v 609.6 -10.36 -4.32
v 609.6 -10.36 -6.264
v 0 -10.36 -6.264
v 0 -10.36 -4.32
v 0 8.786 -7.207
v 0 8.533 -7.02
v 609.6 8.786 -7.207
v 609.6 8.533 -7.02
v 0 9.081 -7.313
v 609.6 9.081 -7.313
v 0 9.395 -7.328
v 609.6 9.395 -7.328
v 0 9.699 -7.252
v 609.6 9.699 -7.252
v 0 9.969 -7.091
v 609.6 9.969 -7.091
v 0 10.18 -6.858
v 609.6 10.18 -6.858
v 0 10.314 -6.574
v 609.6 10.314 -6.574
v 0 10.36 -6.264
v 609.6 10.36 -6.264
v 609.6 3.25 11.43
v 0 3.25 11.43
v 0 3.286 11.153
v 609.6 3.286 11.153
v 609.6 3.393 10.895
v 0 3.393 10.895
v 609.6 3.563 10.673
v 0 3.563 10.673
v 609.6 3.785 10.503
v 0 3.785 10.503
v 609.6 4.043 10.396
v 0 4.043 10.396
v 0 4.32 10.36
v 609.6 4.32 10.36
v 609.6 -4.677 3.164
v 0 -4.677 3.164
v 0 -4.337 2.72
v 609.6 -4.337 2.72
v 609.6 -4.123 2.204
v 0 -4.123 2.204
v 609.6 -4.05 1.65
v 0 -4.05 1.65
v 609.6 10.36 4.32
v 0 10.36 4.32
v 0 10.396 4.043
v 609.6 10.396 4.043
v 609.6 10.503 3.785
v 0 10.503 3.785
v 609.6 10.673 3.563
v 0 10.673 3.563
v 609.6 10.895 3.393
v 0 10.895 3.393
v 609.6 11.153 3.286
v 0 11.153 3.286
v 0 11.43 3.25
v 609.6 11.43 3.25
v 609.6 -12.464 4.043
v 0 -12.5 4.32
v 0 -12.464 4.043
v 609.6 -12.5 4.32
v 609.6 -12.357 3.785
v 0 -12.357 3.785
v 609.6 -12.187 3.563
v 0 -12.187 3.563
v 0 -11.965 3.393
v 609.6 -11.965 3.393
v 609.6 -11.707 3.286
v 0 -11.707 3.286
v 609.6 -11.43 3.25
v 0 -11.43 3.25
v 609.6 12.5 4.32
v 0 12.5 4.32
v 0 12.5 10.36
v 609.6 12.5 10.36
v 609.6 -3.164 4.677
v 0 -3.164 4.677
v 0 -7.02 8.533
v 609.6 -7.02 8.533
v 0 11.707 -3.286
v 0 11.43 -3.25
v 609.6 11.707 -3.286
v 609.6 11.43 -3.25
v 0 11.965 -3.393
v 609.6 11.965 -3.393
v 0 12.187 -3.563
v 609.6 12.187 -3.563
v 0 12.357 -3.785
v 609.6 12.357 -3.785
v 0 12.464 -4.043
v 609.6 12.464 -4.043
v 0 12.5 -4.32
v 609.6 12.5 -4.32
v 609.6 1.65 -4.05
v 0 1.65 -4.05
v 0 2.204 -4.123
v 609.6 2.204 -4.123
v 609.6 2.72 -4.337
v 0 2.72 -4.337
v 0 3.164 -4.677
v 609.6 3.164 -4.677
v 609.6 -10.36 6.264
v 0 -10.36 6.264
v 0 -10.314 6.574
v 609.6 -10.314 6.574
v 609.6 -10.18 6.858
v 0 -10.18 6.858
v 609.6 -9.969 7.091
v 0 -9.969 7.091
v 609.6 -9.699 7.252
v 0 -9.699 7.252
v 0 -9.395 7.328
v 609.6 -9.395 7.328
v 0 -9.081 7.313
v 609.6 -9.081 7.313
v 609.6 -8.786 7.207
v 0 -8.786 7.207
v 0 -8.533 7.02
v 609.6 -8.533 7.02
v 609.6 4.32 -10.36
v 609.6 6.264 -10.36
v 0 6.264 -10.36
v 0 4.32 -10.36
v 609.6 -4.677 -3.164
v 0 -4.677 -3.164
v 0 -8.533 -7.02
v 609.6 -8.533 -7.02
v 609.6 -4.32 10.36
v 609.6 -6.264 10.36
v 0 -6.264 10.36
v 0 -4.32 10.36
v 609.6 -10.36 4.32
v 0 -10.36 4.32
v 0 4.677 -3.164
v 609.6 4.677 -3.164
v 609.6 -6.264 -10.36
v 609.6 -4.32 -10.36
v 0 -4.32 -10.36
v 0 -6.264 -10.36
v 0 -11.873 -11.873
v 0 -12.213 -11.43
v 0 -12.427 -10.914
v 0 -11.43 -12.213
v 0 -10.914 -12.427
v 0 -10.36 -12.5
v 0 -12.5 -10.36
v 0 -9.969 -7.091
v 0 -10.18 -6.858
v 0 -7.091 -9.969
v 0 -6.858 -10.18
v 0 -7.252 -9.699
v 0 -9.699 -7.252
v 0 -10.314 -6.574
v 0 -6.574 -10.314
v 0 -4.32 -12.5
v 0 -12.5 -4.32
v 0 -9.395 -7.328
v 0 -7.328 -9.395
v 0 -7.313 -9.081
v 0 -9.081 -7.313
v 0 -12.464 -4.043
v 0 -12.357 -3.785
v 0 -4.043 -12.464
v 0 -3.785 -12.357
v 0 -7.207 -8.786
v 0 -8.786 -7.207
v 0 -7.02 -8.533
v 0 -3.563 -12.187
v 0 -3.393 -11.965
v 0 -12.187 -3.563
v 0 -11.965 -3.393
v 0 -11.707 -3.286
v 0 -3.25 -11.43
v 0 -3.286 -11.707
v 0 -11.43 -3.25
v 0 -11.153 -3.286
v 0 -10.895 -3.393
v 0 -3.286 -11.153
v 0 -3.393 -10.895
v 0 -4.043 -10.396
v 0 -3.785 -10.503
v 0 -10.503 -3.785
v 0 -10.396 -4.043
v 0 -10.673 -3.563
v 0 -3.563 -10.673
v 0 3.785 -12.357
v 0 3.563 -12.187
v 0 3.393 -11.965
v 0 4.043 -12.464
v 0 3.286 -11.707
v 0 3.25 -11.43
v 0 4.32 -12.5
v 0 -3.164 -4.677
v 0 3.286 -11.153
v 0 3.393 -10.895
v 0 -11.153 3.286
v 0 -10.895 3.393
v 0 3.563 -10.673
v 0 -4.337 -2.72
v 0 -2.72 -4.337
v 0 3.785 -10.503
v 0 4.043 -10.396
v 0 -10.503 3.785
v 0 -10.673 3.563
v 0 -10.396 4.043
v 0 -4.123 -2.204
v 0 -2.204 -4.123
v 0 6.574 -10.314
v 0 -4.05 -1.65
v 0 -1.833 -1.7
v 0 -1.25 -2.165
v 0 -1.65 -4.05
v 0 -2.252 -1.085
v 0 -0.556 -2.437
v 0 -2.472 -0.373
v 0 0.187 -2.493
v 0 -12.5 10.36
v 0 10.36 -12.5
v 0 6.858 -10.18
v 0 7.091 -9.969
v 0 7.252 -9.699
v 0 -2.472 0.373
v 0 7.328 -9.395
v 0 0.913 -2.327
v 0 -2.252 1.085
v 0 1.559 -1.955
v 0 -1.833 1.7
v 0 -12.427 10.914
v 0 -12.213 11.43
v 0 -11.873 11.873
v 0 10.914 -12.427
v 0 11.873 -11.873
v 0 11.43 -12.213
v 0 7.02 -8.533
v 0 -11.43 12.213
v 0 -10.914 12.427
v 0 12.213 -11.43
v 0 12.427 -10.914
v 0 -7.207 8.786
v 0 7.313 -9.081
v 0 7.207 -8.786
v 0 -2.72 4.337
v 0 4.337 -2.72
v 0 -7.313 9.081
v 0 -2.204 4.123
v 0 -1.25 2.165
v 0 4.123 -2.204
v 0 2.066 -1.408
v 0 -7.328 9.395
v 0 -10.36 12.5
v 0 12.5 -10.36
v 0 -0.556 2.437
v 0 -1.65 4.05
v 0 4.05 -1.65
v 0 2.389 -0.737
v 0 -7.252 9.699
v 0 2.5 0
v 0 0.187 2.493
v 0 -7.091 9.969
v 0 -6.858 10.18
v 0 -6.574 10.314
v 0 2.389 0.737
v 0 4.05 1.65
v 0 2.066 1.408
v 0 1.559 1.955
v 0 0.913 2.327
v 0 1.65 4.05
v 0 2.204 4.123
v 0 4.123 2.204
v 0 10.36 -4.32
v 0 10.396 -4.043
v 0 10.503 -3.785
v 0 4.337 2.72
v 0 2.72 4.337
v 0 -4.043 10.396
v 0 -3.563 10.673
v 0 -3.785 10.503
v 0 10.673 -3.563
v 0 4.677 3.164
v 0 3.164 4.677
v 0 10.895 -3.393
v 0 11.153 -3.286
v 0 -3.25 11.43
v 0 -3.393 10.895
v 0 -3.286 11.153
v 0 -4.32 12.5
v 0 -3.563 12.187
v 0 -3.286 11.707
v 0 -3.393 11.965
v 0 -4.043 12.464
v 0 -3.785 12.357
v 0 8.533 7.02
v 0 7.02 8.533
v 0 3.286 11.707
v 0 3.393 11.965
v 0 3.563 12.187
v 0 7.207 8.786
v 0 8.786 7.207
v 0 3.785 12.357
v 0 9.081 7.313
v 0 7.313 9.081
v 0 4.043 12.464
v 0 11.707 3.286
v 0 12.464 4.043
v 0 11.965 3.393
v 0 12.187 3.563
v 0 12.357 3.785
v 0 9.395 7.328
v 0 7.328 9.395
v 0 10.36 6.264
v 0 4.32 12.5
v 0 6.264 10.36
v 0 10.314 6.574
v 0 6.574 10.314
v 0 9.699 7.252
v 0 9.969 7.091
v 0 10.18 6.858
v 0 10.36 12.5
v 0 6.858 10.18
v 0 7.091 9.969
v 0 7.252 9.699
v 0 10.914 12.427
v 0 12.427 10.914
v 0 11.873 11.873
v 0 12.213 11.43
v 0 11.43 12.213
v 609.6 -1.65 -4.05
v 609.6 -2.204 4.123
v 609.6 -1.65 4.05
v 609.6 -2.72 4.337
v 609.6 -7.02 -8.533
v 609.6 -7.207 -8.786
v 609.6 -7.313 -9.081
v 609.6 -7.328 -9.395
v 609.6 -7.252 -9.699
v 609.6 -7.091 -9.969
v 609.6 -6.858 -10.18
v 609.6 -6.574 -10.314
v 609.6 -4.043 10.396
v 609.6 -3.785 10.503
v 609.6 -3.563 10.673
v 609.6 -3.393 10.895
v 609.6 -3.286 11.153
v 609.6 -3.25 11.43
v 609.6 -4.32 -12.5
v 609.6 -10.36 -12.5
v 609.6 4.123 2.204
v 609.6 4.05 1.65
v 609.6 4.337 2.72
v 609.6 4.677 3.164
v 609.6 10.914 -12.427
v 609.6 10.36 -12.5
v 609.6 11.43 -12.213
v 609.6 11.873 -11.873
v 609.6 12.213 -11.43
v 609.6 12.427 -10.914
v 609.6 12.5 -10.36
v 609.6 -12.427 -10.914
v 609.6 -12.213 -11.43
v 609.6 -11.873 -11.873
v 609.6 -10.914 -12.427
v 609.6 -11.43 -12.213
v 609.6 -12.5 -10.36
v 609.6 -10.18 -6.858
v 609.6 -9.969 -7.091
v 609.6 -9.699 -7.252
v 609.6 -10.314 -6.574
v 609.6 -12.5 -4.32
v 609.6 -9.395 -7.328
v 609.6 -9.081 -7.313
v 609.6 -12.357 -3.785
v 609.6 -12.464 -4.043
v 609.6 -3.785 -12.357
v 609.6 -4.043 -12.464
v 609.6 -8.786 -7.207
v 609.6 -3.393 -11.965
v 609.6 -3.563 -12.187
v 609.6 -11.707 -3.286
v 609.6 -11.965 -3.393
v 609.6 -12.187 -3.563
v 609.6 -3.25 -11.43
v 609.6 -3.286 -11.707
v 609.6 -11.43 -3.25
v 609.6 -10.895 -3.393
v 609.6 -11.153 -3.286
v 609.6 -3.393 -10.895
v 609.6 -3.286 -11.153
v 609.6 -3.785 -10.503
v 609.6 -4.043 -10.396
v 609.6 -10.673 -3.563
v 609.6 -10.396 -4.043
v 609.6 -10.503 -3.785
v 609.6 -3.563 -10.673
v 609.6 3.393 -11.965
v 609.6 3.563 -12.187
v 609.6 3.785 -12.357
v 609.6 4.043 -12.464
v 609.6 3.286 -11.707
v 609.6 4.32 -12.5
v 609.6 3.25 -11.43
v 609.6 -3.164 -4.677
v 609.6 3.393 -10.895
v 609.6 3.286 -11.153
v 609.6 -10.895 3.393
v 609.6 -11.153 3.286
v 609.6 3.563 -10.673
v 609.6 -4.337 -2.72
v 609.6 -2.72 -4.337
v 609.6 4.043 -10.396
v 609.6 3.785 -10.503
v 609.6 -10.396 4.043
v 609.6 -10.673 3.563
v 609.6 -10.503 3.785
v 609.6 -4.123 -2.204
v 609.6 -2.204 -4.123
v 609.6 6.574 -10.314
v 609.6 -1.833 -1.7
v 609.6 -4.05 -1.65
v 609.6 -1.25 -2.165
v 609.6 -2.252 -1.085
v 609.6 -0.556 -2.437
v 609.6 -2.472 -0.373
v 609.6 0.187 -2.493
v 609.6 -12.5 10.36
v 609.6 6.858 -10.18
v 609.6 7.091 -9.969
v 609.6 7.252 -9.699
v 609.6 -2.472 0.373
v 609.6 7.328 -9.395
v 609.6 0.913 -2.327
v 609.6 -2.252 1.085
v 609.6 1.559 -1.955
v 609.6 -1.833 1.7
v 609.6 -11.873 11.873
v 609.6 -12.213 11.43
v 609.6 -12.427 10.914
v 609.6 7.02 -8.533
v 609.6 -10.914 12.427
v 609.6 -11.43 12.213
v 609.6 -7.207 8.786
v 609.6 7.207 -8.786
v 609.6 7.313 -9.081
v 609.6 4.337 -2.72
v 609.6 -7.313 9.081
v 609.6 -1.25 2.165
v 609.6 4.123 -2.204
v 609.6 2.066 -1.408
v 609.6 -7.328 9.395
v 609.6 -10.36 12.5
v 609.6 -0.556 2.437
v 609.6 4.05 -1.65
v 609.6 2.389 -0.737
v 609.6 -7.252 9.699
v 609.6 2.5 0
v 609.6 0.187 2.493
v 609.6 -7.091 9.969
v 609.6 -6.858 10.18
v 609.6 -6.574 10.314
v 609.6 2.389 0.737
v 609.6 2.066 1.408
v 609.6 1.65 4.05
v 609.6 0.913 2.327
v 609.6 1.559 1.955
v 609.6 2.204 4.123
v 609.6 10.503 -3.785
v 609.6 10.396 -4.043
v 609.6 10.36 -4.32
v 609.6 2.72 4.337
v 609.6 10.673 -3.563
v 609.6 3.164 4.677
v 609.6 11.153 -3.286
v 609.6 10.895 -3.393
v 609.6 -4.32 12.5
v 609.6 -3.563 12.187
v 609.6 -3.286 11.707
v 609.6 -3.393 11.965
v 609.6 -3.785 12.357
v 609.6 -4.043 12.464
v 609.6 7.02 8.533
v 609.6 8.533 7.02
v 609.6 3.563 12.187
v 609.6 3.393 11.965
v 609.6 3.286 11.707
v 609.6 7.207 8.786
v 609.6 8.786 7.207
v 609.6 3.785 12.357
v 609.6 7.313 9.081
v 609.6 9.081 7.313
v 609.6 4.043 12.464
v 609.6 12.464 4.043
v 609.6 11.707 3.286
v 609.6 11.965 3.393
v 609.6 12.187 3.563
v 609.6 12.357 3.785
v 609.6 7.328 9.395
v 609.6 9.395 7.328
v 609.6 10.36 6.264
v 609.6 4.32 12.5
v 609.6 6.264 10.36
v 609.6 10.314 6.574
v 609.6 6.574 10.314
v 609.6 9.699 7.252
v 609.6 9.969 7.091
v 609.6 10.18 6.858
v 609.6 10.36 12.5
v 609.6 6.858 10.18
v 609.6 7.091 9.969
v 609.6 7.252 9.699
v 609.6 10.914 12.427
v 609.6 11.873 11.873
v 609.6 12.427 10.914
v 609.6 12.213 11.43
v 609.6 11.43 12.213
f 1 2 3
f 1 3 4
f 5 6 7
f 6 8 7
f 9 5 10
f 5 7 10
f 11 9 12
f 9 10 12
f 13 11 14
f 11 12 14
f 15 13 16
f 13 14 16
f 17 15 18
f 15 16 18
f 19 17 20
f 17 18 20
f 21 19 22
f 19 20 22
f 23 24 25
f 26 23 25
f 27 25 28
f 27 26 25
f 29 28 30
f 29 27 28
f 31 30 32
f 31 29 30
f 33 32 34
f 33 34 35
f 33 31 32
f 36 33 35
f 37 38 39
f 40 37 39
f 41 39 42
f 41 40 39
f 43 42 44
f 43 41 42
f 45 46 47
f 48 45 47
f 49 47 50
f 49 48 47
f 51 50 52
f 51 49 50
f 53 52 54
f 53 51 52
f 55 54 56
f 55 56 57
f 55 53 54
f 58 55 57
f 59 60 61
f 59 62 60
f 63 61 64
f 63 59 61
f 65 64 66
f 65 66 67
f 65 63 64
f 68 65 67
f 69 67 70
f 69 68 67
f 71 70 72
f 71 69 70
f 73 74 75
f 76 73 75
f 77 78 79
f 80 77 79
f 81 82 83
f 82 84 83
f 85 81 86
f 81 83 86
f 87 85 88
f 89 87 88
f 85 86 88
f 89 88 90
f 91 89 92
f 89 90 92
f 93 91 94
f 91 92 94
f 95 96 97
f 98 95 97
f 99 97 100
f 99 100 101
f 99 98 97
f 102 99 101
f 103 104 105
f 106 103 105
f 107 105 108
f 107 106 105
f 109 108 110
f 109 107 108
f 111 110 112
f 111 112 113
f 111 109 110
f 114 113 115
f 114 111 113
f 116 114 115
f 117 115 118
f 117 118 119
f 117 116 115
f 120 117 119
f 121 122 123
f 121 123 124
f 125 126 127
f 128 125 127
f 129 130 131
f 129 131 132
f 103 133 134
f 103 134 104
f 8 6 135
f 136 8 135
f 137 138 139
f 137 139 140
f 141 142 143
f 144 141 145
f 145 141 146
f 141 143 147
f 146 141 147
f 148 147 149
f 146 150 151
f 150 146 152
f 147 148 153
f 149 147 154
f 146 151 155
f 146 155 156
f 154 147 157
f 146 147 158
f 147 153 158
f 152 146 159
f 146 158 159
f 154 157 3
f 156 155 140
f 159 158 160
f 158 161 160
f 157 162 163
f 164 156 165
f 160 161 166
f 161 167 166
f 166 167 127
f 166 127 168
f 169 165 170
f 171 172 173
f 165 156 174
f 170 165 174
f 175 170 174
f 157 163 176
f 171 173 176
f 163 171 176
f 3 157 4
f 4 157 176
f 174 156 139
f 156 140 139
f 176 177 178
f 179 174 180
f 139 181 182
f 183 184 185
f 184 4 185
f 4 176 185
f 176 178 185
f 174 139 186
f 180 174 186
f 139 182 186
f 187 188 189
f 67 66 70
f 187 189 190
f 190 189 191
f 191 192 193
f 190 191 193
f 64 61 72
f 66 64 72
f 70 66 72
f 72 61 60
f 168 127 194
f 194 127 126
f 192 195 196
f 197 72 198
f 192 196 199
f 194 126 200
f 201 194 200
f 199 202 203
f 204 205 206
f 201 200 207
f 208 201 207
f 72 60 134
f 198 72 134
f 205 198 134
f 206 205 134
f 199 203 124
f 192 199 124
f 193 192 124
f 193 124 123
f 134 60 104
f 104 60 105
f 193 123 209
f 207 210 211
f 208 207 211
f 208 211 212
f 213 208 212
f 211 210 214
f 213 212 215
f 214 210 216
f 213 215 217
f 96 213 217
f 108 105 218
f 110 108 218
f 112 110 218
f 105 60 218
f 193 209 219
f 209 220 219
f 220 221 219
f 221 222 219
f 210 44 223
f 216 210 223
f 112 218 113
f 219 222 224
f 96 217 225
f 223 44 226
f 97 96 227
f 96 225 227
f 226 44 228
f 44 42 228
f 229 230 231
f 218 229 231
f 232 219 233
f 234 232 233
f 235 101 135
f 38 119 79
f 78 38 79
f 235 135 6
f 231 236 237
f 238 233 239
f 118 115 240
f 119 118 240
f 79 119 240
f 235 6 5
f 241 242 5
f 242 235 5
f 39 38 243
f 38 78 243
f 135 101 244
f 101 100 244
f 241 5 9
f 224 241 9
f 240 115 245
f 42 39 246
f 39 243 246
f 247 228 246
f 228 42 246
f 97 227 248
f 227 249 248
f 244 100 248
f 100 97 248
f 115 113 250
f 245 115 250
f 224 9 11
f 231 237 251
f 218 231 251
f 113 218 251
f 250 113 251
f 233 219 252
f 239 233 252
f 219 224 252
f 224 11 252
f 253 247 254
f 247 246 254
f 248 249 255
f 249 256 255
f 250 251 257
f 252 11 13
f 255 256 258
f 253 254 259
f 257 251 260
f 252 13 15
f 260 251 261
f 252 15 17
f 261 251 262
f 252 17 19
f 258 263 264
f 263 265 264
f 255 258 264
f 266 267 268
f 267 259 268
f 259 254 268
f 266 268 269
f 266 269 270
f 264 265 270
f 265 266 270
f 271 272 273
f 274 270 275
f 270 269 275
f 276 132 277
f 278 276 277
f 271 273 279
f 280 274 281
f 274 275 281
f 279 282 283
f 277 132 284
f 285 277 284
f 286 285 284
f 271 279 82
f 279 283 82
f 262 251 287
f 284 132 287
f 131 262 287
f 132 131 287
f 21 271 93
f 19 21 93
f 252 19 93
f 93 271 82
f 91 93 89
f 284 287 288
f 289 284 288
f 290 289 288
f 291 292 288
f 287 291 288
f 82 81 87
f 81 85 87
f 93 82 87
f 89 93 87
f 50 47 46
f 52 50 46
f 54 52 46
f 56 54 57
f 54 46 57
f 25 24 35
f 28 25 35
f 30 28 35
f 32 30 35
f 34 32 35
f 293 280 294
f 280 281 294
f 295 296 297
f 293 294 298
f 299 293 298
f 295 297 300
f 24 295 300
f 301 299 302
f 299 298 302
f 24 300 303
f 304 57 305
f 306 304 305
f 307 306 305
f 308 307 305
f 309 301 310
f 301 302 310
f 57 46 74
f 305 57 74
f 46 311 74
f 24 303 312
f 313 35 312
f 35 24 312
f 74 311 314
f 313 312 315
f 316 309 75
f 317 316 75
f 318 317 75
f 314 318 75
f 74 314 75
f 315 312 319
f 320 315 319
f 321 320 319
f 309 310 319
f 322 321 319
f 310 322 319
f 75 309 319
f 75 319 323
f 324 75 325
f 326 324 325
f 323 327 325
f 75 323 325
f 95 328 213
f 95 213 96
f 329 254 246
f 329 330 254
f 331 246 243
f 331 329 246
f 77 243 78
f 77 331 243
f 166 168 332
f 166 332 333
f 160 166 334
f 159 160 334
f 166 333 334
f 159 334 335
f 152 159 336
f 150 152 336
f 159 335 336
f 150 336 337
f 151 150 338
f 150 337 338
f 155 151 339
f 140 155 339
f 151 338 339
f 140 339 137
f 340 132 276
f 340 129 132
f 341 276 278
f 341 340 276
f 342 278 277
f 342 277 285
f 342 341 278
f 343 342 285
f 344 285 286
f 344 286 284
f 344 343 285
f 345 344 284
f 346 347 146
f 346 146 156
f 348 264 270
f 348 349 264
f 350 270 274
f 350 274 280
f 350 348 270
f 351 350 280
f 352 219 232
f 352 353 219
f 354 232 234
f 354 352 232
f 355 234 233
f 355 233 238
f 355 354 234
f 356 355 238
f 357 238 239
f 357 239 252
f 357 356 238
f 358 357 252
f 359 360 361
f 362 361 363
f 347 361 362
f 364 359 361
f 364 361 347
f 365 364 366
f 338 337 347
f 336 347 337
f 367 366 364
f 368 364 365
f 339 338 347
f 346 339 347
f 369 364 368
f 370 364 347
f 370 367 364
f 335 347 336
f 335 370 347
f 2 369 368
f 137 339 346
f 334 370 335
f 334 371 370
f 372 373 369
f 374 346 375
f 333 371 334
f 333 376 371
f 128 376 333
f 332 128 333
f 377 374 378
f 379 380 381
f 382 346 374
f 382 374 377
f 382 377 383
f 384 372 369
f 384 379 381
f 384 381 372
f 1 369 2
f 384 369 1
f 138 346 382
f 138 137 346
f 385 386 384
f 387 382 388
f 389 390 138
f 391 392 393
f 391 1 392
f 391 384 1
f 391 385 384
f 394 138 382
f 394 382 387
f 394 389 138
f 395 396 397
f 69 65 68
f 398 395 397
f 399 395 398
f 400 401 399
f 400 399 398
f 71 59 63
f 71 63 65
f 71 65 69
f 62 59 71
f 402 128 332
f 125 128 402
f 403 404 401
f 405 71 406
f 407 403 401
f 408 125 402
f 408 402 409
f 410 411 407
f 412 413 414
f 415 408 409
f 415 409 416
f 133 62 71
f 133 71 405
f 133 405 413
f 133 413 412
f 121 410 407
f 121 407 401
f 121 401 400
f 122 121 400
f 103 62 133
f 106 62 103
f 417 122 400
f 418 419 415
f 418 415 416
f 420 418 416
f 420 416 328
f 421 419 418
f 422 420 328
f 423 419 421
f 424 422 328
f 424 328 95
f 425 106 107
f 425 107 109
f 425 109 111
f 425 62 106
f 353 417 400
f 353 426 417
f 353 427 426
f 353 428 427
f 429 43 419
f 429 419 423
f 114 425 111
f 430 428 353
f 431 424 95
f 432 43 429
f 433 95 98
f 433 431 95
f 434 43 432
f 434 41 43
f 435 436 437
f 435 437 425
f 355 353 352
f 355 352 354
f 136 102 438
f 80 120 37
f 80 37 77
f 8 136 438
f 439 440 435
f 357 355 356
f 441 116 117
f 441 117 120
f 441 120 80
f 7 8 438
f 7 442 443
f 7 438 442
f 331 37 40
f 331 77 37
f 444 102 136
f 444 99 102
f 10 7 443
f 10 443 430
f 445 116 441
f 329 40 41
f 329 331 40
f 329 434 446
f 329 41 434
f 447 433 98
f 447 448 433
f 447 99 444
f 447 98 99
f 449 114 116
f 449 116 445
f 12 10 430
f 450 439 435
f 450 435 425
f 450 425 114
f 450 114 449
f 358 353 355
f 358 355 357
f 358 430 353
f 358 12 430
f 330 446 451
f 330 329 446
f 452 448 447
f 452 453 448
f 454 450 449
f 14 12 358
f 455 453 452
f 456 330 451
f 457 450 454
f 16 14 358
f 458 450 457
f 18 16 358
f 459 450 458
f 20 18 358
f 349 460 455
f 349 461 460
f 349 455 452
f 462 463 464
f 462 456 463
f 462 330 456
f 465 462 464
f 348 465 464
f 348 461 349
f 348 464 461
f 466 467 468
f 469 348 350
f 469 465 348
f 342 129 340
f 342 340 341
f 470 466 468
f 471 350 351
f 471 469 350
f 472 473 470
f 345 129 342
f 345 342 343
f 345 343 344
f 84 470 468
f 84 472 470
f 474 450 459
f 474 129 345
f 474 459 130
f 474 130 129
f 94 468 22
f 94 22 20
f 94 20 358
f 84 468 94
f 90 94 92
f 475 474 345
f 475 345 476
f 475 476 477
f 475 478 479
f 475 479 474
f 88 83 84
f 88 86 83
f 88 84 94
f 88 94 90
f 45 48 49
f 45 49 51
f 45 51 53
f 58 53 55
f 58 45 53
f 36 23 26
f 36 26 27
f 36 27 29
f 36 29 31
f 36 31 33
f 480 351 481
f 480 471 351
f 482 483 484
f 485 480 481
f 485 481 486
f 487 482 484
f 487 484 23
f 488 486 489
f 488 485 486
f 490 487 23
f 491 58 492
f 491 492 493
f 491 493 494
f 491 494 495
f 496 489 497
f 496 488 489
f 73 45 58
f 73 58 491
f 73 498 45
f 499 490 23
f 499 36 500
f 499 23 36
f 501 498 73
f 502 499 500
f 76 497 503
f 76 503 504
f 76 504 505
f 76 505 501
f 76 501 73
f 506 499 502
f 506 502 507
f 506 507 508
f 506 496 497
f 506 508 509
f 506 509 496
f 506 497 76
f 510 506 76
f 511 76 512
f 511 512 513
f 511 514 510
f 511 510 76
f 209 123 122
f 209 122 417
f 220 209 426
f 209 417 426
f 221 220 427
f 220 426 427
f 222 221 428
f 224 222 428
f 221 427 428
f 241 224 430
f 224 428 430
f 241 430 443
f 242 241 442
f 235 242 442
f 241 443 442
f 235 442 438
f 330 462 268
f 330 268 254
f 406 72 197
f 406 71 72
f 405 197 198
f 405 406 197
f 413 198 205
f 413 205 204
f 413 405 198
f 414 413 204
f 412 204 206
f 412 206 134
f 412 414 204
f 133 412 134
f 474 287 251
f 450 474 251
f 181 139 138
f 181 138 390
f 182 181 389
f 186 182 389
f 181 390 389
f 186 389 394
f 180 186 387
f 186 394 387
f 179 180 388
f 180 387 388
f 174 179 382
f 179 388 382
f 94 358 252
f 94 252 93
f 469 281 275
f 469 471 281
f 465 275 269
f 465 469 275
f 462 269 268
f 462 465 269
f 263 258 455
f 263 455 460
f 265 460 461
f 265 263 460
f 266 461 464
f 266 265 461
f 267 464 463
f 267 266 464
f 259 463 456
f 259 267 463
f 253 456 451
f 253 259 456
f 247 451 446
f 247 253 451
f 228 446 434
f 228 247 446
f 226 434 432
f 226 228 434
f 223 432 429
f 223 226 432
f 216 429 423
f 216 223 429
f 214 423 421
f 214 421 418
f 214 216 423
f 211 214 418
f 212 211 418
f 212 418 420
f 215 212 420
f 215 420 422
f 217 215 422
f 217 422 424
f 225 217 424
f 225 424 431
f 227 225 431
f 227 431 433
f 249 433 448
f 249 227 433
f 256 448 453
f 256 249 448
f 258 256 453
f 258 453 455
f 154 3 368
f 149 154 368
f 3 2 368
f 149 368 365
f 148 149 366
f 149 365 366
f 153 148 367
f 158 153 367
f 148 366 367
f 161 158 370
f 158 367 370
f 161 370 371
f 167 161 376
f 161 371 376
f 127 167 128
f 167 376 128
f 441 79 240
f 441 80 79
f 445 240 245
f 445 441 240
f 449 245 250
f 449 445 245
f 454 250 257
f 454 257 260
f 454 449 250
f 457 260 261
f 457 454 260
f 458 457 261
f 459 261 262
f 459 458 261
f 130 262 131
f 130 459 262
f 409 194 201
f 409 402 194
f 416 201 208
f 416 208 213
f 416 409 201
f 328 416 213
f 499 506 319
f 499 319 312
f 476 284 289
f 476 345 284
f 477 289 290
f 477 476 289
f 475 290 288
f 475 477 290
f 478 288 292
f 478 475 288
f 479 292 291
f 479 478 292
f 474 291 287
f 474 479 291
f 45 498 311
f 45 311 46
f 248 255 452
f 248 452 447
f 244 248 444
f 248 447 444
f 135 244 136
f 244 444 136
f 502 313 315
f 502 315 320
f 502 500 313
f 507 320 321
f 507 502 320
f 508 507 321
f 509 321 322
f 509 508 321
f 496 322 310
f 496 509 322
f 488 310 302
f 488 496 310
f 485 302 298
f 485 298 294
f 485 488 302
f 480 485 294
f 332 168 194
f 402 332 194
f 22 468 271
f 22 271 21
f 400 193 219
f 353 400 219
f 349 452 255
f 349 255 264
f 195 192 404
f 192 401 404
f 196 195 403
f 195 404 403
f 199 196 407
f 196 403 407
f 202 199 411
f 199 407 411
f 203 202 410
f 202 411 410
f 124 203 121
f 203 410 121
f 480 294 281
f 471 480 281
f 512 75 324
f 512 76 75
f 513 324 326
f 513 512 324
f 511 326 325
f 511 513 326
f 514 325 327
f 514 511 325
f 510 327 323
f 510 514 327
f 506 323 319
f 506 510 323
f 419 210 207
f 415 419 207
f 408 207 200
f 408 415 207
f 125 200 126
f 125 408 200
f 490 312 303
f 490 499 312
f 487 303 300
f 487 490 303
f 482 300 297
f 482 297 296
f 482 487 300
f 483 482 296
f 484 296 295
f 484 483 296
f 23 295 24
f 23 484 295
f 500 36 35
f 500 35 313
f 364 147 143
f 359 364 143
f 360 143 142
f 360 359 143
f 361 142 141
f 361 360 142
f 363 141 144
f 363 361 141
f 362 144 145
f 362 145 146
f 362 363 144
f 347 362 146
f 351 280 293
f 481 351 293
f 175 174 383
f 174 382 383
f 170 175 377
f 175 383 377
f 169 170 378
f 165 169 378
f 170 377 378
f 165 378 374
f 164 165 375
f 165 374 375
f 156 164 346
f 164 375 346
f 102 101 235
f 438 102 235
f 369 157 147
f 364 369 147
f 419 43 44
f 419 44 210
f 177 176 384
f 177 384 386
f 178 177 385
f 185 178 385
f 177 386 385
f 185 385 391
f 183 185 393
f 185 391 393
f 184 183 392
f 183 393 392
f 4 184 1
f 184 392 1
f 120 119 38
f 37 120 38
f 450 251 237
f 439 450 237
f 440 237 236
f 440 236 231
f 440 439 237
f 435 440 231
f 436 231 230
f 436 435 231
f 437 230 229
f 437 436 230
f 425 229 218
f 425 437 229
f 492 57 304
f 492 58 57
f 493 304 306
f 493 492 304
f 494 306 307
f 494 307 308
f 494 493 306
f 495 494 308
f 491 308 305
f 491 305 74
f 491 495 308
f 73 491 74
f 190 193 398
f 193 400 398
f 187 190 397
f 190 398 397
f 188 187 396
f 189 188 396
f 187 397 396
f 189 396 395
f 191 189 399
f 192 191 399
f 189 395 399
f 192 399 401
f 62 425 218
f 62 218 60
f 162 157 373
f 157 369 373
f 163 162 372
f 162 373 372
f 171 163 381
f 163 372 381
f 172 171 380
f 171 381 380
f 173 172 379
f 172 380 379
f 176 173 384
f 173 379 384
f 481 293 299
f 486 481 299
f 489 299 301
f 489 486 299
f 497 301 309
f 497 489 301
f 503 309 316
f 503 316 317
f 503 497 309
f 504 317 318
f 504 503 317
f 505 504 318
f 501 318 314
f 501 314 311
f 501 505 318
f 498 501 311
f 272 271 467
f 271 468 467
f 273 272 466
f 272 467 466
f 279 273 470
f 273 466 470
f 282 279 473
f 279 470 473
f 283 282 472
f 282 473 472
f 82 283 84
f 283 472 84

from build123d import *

# Parameters (mm, degrees)
F0_R     = 2.5
F2_DEPTH = 609.6
F3_R     = 2.14
F4_R     = 1.06999


# Not quite as in the source:
# - a fillet or chamfer is up to 0.001 mm smaller than in the source, because OpenCascade refuses the exact size


with BuildPart() as f2:
    # F0 (on Right) → F2 (new body)
    with BuildSketch(Plane.YZ):
        Polygon((2.5367914883, -4.05), (4.05, -4.05), (4.05, -2.5367914883), (4.05, 2.5367914883), (4.05, 4.05), (2.5367914883, 4.05), (-2.5367914883, 4.05), (-4.05, 4.05), (-4.05, 2.5367914883), (-4.05, -2.5367914883), (-4.05, -4.05), (-2.5367914883, -4.05), align=None)
        Circle(F0_R, mode=Mode.SUBTRACT)
        Polygon((-10.36, 8.8467914883), (-4.05, 2.5367914883), (-4.05, 4.05), (-2.5367914883, 4.05), (-8.8467914883, 10.36), (-3.25, 10.36), (-3.25, 12.5), (-12.5, 12.5), (-12.5, 3.25), (-10.36, 3.25), align=None)
        Polygon((4.05, 4.05), (4.05, 2.5367914883), (10.36, 8.8467914883), (10.36, 3.25), (12.5, 3.25), (12.5, 12.5), (3.25, 12.5), (3.25, 10.36), (8.8467914883, 10.36), (2.5367914883, 4.05), align=None)
        Polygon((-8.8467914883, -10.36), (-2.5367914883, -4.05), (-4.05, -4.05), (-4.05, -2.5367914883), (-10.36, -8.8467914883), (-10.36, -3.25), (-12.5, -3.25), (-12.5, -12.5), (-3.25, -12.5), (-3.25, -10.36), align=None)
        Polygon((4.05, -2.5367914883), (4.05, -4.05), (2.5367914883, -4.05), (8.8467914883, -10.36), (3.25, -10.36), (3.25, -12.5), (12.5, -12.5), (12.5, -3.25), (10.36, -3.25), (10.36, -8.8467914883), align=None)
    extrude(amount=F2_DEPTH)

    # F3
    f3_edges = [f2.edges().sort_by_distance(p)[0] for p in [
        (304.8, -12.5, 12.5),
        (304.8, 12.5, 12.5),
        (304.8, 12.5, -12.5),
        (304.8, -12.5, -12.5),
        (304.8, -4.05, 2.536791),
        (304.8, -4.05, -2.536791),
        (304.8, -2.536791, 4.05),
        (304.8, 2.536791, 4.05),
        (304.8, 4.05, 2.536791),
        (304.8, 4.05, -2.536791),
        (304.8, -2.536791, -4.05),
        (304.8, 2.536791, -4.05),
    ]]
    fillet(f3_edges, radius=F3_R)

    # F4 (radius 1.07 in the source; OpenCascade refuses exactly that, so slightly less here)
    f4_edges = [f2.edges().sort_by_distance(p)[0] for p in [
        (304.8, -12.5, 3.25),
        (304.8, -10.36, 3.25),
        (304.8, -3.25, 12.5),
        (304.8, -3.25, 10.36),
        (304.8, 3.25, 12.5),
        (304.8, 3.25, 10.36),
        (304.8, 10.36, 3.25),
        (304.8, 12.5, 3.25),
        (304.8, 10.36, -3.25),
        (304.8, 12.5, -3.25),
        (304.8, 3.25, -10.36),
        (304.8, 3.25, -12.5),
        (304.8, -3.25, -10.36),
        (304.8, -3.25, -12.5),
        (304.8, -10.36, 8.846791),
        (304.8, -8.846791, 10.36),
        (304.8, 8.846791, 10.36),
        (304.8, 10.36, 8.846791),
        (304.8, 8.846791, -10.36),
        (304.8, 10.36, -8.846791),
        (304.8, -8.846791, -10.36),
        (304.8, -10.36, -8.846791),
        (304.8, -10.36, -3.25),
        (304.8, -12.5, -3.25),
    ]]
    fillet(f4_edges, radius=F4_R)


solid = f2.part
